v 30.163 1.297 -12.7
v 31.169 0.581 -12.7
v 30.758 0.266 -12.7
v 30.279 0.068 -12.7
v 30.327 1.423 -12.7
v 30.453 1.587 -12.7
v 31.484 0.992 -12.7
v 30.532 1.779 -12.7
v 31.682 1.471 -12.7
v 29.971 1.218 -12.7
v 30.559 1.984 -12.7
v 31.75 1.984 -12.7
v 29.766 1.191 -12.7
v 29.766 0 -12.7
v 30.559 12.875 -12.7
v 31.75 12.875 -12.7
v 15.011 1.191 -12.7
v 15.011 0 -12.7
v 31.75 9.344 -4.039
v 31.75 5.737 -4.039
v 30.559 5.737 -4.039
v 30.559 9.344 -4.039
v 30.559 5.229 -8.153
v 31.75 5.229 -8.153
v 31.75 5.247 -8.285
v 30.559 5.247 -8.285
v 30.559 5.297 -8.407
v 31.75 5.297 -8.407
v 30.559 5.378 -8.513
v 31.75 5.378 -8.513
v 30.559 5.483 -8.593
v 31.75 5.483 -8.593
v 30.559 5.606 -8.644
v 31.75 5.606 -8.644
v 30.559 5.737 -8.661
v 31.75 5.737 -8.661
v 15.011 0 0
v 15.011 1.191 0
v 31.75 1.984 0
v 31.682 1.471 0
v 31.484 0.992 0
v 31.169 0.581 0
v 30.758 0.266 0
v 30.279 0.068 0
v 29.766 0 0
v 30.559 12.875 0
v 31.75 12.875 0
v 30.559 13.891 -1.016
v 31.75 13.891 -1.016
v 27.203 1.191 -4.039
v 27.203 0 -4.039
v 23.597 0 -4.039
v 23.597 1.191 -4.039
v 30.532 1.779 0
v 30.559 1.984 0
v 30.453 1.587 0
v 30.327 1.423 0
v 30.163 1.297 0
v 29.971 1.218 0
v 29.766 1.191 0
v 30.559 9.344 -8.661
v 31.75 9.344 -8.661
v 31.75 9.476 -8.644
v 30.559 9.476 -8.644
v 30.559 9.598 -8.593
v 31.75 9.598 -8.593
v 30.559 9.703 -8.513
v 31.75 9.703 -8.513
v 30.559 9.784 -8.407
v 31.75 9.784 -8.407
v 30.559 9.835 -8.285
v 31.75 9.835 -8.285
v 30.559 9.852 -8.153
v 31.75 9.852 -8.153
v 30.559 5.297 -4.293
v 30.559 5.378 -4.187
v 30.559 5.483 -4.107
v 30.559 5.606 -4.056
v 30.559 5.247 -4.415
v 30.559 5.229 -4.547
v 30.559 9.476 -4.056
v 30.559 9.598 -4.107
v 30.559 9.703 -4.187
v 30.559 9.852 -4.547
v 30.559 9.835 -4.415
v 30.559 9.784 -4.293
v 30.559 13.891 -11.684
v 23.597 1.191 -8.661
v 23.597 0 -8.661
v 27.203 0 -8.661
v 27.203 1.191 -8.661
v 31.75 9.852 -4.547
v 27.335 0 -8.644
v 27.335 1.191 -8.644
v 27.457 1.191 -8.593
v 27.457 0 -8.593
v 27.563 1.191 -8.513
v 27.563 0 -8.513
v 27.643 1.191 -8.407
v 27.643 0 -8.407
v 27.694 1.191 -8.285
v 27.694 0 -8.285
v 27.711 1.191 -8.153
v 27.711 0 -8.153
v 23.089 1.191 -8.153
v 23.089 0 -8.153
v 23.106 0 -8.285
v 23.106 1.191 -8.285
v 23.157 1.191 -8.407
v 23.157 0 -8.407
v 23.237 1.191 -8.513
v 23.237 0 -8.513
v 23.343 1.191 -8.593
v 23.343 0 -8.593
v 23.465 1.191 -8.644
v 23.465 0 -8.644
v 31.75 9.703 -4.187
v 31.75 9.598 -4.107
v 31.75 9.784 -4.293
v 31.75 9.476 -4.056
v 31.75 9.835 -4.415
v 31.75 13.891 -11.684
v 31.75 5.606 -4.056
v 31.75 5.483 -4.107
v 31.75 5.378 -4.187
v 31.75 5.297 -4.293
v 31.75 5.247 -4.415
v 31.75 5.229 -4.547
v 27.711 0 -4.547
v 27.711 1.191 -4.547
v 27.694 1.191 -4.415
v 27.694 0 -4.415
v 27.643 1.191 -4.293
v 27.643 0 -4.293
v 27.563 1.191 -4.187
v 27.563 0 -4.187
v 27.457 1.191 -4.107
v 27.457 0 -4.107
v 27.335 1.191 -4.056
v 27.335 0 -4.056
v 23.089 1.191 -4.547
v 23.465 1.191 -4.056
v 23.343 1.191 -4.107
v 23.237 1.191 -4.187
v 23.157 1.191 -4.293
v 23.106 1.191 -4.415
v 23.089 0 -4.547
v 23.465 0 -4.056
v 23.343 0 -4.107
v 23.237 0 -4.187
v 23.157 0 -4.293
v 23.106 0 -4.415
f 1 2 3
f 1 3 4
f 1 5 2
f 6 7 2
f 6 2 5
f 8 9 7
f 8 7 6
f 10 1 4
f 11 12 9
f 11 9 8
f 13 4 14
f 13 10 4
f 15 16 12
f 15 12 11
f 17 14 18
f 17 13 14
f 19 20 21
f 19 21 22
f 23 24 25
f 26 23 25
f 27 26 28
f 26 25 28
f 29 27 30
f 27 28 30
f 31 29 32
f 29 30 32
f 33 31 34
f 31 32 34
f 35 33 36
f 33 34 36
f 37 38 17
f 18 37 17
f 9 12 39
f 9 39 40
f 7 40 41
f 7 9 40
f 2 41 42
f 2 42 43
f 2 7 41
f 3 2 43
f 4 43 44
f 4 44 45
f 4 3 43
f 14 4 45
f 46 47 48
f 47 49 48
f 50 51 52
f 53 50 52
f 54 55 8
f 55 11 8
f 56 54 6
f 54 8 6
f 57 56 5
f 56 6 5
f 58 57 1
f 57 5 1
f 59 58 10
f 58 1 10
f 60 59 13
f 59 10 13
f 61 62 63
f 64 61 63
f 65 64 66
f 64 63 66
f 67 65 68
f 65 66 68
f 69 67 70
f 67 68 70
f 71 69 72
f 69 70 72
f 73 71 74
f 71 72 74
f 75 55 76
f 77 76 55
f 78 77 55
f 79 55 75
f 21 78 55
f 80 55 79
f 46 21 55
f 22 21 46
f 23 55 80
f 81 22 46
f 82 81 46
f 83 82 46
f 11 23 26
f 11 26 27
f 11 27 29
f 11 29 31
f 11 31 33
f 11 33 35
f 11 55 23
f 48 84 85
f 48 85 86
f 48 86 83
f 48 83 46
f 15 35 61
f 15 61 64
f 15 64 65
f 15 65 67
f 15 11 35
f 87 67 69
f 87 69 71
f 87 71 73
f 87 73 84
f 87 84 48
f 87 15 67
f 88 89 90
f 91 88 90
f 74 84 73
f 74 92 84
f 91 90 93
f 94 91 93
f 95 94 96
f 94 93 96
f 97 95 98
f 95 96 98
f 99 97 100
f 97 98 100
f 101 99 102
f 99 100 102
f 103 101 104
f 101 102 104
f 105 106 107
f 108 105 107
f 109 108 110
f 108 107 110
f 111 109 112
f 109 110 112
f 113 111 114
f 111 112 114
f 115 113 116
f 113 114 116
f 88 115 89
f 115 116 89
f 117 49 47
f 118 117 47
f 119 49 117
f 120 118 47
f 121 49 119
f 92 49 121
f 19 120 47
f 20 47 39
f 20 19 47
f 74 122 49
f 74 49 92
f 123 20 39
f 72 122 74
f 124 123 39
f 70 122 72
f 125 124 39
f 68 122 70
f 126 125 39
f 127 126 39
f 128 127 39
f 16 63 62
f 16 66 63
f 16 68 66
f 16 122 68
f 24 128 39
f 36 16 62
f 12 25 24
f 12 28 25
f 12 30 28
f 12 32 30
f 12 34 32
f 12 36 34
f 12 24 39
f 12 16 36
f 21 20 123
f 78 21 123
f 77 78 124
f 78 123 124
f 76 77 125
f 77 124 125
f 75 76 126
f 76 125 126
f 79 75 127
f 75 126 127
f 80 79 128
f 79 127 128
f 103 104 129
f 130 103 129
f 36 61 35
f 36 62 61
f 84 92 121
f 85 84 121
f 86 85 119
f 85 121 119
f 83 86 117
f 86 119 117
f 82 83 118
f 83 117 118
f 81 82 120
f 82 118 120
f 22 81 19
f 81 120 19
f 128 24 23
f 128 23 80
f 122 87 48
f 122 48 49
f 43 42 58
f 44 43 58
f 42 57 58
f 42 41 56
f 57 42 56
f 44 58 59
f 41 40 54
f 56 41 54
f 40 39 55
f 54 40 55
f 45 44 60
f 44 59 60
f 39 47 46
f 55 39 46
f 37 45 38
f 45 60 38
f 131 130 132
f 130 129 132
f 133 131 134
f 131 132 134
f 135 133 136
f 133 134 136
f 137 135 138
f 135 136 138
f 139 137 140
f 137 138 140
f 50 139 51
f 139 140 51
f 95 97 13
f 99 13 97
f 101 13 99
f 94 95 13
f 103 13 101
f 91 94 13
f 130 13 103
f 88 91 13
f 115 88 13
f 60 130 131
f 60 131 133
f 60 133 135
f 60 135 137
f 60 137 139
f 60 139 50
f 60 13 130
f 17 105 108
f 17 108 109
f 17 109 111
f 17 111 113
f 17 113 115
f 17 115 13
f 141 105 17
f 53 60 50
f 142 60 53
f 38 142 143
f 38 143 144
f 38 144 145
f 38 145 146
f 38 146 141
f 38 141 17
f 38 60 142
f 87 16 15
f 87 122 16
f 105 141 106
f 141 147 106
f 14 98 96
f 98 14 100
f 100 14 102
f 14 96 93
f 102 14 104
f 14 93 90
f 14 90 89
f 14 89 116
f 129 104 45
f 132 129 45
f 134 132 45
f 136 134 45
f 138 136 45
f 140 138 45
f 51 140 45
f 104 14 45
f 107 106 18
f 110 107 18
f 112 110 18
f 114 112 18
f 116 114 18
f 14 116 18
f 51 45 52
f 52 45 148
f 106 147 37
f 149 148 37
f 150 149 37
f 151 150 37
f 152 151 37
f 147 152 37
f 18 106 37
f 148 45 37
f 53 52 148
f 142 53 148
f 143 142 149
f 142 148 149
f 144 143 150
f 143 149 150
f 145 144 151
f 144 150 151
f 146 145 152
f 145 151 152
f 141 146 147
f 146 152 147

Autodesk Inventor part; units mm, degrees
ref_plane "YZ Plane" through (0, 0, 0) normal (1, 0, 0) x (0, 1, 0)
ref_plane "XZ Plane" through (0, 0, 0) normal (0, 1, 0) x (-1, 0, 0)
sketch "Sketch1" plane through (0, 0, 0) normal (0, 1, 0) x (-1, 0, 0)
  line L0 (-31.75, 0) -> (31.75, 0)
  line L1 (31.75, 0) -> (31.75, -12.7)
  line L2 (31.75, -12.7) -> (-31.75, -12.7)
  line L3 (-31.75, -12.7) -> (-31.75, 0)
  line L4 (31.75, 0) -> (-31.75, -12.7) construction
  point P0 (0, 0)
  point P1 (0, 0)
  dimension "d0" = 63.5
  dimension "d1" = 12.7
extrude "Plate1" add sketch "Sketch1" along normal blind 1.1906
sketch "Sketch2" plane through (30.5594, 0, -12.7) normal (1, 0, 0) x (0, 1, 0)
  line L0 (0, 12.7) -> (0, 0)
  line L1 (0, 0) -> (13.8906, 0)
  line L2 (13.8906, 0) -> (13.8906, 12.7)
  line L3 (13.8906, 12.7) -> (0, 12.7)
edge flange "Flanges" height 12.7 angle 90 thickness 1.1906 bend radius 0.7937 thickness toward (1, 0, 0) relief tear relief width 1.1906 relief depth 0.5953 corner gap 1.1906 corner form 0 edges at (31.75, 1.1906, -6.35) (-31.75, 1.1906, -6.35) wall of the first edge with corners at (30.5594, 0, 0) (30.5594, 0, -12.7) (30.5594, 13.8906, -12.7) (30.5594, 13.8906, 0)
bend "Bend1"
corner "Corner1"
sketch "Sketch3" plane through (31.75, 1.9844, -12.7) normal (1, 0, 0) x (0, 0, -1)
  line L0 (-8.1534, 7.8677) -> (-4.5466, 7.8677)
  line L1 (-4.0386, 7.3597) -> (-4.0386, 3.7529)
  line L2 (-4.5466, 3.2449) -> (-8.1534, 3.2449)
  line L3 (-8.6614, 3.7529) -> (-8.6614, 7.3597)
  arc A0 (-8.1534, 7.8677) -> (-8.6614, 7.3597) centre (-8.1534, 7.3597) ccw
  arc A1 (-4.0386, 7.3597) -> (-4.5466, 7.8677) centre (-4.5466, 7.3597) ccw
  arc A2 (-4.5466, 3.2449) -> (-4.0386, 3.7529) centre (-4.5466, 3.7529) ccw
  arc A3 (-8.6614, 3.7529) -> (-8.1534, 3.2449) centre (-8.1534, 3.7529) ccw
  line L4 (-12.7, 0) -> (-12.7, 11.9063) construction
  line L5 (-12.7, 11.9063) -> (0, 11.9063) construction
  line L6 (-8.1534, 7.3597) -> (-4.5466, 3.7529) construction
  point P0 (-12.7, -1.9844)
  point P1 (-4.0386, 3.2449)
  point P2 (-8.6614, 3.2449)
  point P3 (-6.35, 5.5563)
  dimension "d16" = 4.6228
  dimension "d17" = 0.508
  dimension "d20" = 6.35
  dimension "d21" = 6.35
extrude "Flange Stamp" cut sketch "Sketch3" against normal blind 1.1906
sketch "Sketch7" plane through (31.75, 1.9844, 0) normal (1, 0, 0) x (0, 0, -1)
  arc A0 (4.5466, 7.8677) -> (4.0386, 7.3597) centre (4.5466, 7.3597) ccw construction
  arc A1 (8.1534, 3.2449) -> (8.6614, 3.7529) centre (8.1534, 3.7529) ccw construction
  circle A2 centre (6.35, 5.5563) radius 2.1844
  line L0 (4.5466, 7.3597) -> (8.1534, 3.7529) construction
  point P0 (0, -1.9844)
  dimension "d46" = 4.3688
surface extrude "Flange Circle" sketch "Sketch7" against normal up to surface (1.1906 mm away) shown yes curves A2
ref_plane "Flange Pattern Plane" through (31.75, 7.5406, -4.5466) normal (0, 1, 0) x (1, 0, 0)
feature "Flange Pattern" [suppressed]
sketch "Sketch8" plane through (0, 0, 0) normal (0, -1, 0) x (1, 0, 0)
  line L0 (29.7656, 0) -> (-29.7656, 0) construction
  line L1 (27.2034, -4.0386) -> (23.5966, -4.0386)
  line L2 (23.0886, -4.5466) -> (23.0886, -8.1534)
  line L3 (23.5966, -8.6614) -> (27.2034, -8.6614)
  line L4 (27.7114, -8.1534) -> (27.7114, -4.5466)
  arc A0 (27.7114, -4.5466) -> (27.2034, -4.0386) centre (27.2034, -4.5466) ccw
  arc A1 (27.2034, -8.6614) -> (27.7114, -8.1534) centre (27.2034, -8.1534) ccw
  arc A2 (23.0886, -8.1534) -> (23.5966, -8.6614) centre (23.5966, -8.1534) ccw
  arc A3 (23.5966, -4.0386) -> (23.0886, -4.5466) centre (23.5966, -4.5466) ccw
  line L5 (27.2034, -4.5466) -> (23.5966, -8.1534) construction
  line L6 (31.75, 0) -> (31.75, -12.7) construction
  point P0 (0, 0)
  point P1 (23.0886, -8.6614)
  point P2 (27.7114, -8.6614)
  point P3 (25.4, -6.35)
  dimension "d49" = 4.6228
  dimension "d50" = 0.508
  dimension "d51" = 6.35
  dimension "d52" = 6.35
extrude "Body Stamp" cut sketch "Sketch8" against normal blind 1.1906
sketch "Sketch9" plane through (0, 0, 0) normal (0, -1, 0) x (1, 0, 0)
  arc A0 (27.7114, -4.5466) -> (27.2034, -4.0386) centre (27.2034, -4.5466) ccw construction
  arc A1 (23.0886, -8.1534) -> (23.5966, -8.6614) centre (23.5966, -8.1534) ccw construction
  line L0 (27.2034, -4.5466) -> (23.5966, -8.1534) construction
  circle A2 centre (25.4, -6.35) radius 2.1844
  point P0 (0, 0)
  dimension "d55" = 4.3688
surface extrude "Body Circle" sketch "Sketch9" against normal up to surface (1.1906 mm away) shown yes curves A2
feature "Body Pattern" [suppressed]
sketch "Arc Length" plane through (30.5594, 1.9844, 0) normal (0, 0, 1) x (1, 0, 0)
  line L0 (0, 0) -> (1.1906, 0) construction
  arc A0 (-0.7938, -0.7938) -> (0, 0) centre (-0.7938, 0) ccw construction
  line L1 (-0.7938, -1.9844) -> (-0.7938, -0.7938) construction
  arc A1 (-0.7938, -1.9844) -> (1.1906, 0) centre (-0.7938, 0) ccw construction
  point P0 (-30.5594, -1.9844)
  dimension "d85" = 3.117
  dimension "d92" = 1.2468
sketch "Sketch13" plane through (31.75, 13.8906, 0) normal (1, 0, 0) x (0, 0, -1)
  line L0 (0, 0) -> (12.7, 0) construction
  line L1 (62.4078, 0) -> (63.4238, -1.016)
  line L2 (63.4238, -1.016) -> (64.4398, 0)
  line L3 (62.4078, 0) -> (64.4398, 0)
  line L4 (12.7, -11.9063) -> (0, -11.9063) construction
  line L5 (63.4238, -10.8903) -> (61.3168, -12.9972)
  line L6 (61.3168, -12.9972) -> (63.4238, -15.1042)
  line L7 (63.4238, -15.1042) -> (65.5308, -12.9972)
  line L8 (65.5308, -12.9972) -> (63.4238, -10.8903)
  line L9 (63.4238, -10.8903) -> (63.4238, -15.1042) construction
  line L10 (63.4238, -1.016) -> (63.4238, -10.8903) construction
  line L11 (0, -11.9063) -> (12.7, -11.9063) construction
  point P0 (0, -13.8906)
  dimension "d86" = 4.2139
  dimension "d88" = 1.016
  dimension "d91" = 1.016
  dimension "d102" = 63.4238
feature "Notch" [suppressed]
mirror "Notch Mirror" [suppressed]
pattern_linear "Notch Pattern" [suppressed]
chamfer "End Chamfer" distance 1.016 angle 45 4 edges at (-31.1547, 13.8906, -12.7) (31.1547, 13.8906, -12.7) (-31.1547, 13.8906, 0) (31.1547, 13.8906, 0)
sketch "Sketch14" plane through (-31.75, 1.9844, 431.8) normal (1, 0, 0) x (0, 0, -1)
  line L0 (431.8, 11.9063) -> (444.5, 11.9063) construction
  line L1 (431.8, 0) -> (431.8, 11.9063) construction
  line L2 (431.8, -1.9844) -> (444.5, -1.9844) construction
  line L3 (431.8, 11.9063) -> (444.5, 11.9063)
  line L4 (444.5, 11.9063) -> (444.5, -1.9844)
  line L5 (444.5, -1.9844) -> (431.8, -1.9844)
  line L6 (431.8, -1.9844) -> (431.8, 11.9063)
  point P0 (382.0521, -1.9844)
extrude "Half Cut" cut sketch "Sketch14" along normal blind 46.7614
sketch "Flange Pattern Sketch" plane through (31.75, 7.5406, -4.5466) normal (0, 1, 0) x (1, 0, 0)
  line L0 (0, 3.6068) -> (0, 0) construction
  line L1 (-76.2822, -4.5466) -> (13.1932, -4.5466) construction
  line L2 (0, 0) -> (-1.1906, 0) construction
  point P0 (-31.75, -4.5466)
  point P1 (0, 1.8034)
  point P2 (0, 14.5034)
  point P3 (0, 27.2034)
  point P4 (0, 39.9034)
  point P5 (0, 52.6034)
  point P6 (0, 65.3034)
  point P7 (0, 78.0034)
  point P8 (0, 90.7034)
  point P9 (0, 103.4034)
  point P10 (0, 116.1034)
  point P11 (0, 128.8034)
  point P12 (0, 141.5034)
  point P13 (0, 154.2034)
  point P14 (0, 166.9034)
  point P15 (0, 179.6034)
  point P16 (0, 192.3034)
  point P17 (0, 205.0034)
  point P18 (0, 217.7034)
  point P19 (0, 230.4034)
  point P20 (0, 243.1034)
  point P21 (0, 255.8034)
  point P22 (0, 268.5034)
  point P23 (0, 281.2034)
  point P24 (0, 293.9034)
  point P25 (0, 306.6034)
  point P26 (0, 319.3034)
  point P27 (0, 332.0034)
  point P28 (0, 344.7034)
  point P29 (0, 357.4034)
  point P30 (0, 370.1034)
  point P31 (0, 382.8034)
  point P32 (0, 395.5034)
  point P33 (0, 408.2034)
  point P34 (0, 420.9034)
  point P35 (0, 433.6034)
  dimension "d131" = 12.7
  dimension "d134" = 12.7
sketch "Body Pattern Sketch" plane through (0, 0, 0) normal (0, -1, 0) x (1, 0, 0)
  line L0 (29.7656, 0) -> (-29.7656, 0) construction
  line L1 (31.75, 0) -> (31.75, -12.7) construction
  circle A0 centre (25.4, -6.35) radius 2.1844 construction
  point P0 (0, 0)
  point P1 (25.4, -19.05)
  point P2 (25.4, -31.75)
  point P3 (25.4, -44.45)
  point P4 (25.4, -57.15)
  point P5 (25.4, -69.85)
  point P6 (25.4, -82.55)
  point P7 (25.4, -95.25)
  point P8 (25.4, -107.95)
  point P9 (25.4, -120.65)
  point P10 (25.4, -133.35)
  point P11 (25.4, -146.05)
  point P12 (25.4, -158.75)
  point P13 (25.4, -171.45)
  point P14 (25.4, -184.15)
  point P15 (25.4, -196.85)
  point P16 (25.4, -209.55)
  point P17 (25.4, -222.25)
  point P18 (25.4, -234.95)
  point P19 (25.4, -247.65)
  point P20 (25.4, -260.35)
  point P21 (25.4, -273.05)
  point P22 (25.4, -285.75)
  point P23 (25.4, -298.45)
  point P24 (25.4, -311.15)
  point P25 (25.4, -323.85)
  point P26 (25.4, -336.55)
  point P27 (25.4, -349.25)
  point P28 (25.4, -361.95)
  point P29 (25.4, -374.65)
  point P30 (25.4, -387.35)
  point P31 (25.4, -400.05)
  point P32 (25.4, -412.75)
  point P33 (25.4, -425.45)
  point P34 (25.4, -438.15)
  dimension "d62" = 12.7
  dimension "d65" = 12.7
  dimension "d139" = 12.7
equation "\"d1\" = 12.7 * Length"
equation "\"d18\" = Thickness"
equation "\"d53\" = Thickness"
equation "\"d89\" = Thickness"
equation "\"d2\" = Thickness"
equation "\"d3\" = BendReliefWidth"
equation "\"d4\" = BendReliefDepth"
equation "\"d5\" = MinimumRemnant"
equation "\"d6\" = TransitionRadius"
equation "\"d10\" = CornerReliefSize"
equation "\"d11\" = GapSize"
equation "\"d12\" = JacobiRadiusSize"
equation "\"BendRadius\" = Thickness"
equation "\"BendReliefWidth\" = Thickness"
equation "\"BendReliefDepth\" = 0.5 * Thickness"
equation "\"CornerReliefSize\" = 4 * Thickness"
equation "\"MinimumRemnant\" = 2 * Thickness"
equation "\"TransitionRadius\" = BendRadius"
equation "\"JacobiRadiusSize\" = BendRadius"
equation "\"GapSize\" = Thickness"
equation "\"Length\" = 1"
equation "\"Thickness\" = 1.190625"
properties part number "Alu C 1x3x1x35"
